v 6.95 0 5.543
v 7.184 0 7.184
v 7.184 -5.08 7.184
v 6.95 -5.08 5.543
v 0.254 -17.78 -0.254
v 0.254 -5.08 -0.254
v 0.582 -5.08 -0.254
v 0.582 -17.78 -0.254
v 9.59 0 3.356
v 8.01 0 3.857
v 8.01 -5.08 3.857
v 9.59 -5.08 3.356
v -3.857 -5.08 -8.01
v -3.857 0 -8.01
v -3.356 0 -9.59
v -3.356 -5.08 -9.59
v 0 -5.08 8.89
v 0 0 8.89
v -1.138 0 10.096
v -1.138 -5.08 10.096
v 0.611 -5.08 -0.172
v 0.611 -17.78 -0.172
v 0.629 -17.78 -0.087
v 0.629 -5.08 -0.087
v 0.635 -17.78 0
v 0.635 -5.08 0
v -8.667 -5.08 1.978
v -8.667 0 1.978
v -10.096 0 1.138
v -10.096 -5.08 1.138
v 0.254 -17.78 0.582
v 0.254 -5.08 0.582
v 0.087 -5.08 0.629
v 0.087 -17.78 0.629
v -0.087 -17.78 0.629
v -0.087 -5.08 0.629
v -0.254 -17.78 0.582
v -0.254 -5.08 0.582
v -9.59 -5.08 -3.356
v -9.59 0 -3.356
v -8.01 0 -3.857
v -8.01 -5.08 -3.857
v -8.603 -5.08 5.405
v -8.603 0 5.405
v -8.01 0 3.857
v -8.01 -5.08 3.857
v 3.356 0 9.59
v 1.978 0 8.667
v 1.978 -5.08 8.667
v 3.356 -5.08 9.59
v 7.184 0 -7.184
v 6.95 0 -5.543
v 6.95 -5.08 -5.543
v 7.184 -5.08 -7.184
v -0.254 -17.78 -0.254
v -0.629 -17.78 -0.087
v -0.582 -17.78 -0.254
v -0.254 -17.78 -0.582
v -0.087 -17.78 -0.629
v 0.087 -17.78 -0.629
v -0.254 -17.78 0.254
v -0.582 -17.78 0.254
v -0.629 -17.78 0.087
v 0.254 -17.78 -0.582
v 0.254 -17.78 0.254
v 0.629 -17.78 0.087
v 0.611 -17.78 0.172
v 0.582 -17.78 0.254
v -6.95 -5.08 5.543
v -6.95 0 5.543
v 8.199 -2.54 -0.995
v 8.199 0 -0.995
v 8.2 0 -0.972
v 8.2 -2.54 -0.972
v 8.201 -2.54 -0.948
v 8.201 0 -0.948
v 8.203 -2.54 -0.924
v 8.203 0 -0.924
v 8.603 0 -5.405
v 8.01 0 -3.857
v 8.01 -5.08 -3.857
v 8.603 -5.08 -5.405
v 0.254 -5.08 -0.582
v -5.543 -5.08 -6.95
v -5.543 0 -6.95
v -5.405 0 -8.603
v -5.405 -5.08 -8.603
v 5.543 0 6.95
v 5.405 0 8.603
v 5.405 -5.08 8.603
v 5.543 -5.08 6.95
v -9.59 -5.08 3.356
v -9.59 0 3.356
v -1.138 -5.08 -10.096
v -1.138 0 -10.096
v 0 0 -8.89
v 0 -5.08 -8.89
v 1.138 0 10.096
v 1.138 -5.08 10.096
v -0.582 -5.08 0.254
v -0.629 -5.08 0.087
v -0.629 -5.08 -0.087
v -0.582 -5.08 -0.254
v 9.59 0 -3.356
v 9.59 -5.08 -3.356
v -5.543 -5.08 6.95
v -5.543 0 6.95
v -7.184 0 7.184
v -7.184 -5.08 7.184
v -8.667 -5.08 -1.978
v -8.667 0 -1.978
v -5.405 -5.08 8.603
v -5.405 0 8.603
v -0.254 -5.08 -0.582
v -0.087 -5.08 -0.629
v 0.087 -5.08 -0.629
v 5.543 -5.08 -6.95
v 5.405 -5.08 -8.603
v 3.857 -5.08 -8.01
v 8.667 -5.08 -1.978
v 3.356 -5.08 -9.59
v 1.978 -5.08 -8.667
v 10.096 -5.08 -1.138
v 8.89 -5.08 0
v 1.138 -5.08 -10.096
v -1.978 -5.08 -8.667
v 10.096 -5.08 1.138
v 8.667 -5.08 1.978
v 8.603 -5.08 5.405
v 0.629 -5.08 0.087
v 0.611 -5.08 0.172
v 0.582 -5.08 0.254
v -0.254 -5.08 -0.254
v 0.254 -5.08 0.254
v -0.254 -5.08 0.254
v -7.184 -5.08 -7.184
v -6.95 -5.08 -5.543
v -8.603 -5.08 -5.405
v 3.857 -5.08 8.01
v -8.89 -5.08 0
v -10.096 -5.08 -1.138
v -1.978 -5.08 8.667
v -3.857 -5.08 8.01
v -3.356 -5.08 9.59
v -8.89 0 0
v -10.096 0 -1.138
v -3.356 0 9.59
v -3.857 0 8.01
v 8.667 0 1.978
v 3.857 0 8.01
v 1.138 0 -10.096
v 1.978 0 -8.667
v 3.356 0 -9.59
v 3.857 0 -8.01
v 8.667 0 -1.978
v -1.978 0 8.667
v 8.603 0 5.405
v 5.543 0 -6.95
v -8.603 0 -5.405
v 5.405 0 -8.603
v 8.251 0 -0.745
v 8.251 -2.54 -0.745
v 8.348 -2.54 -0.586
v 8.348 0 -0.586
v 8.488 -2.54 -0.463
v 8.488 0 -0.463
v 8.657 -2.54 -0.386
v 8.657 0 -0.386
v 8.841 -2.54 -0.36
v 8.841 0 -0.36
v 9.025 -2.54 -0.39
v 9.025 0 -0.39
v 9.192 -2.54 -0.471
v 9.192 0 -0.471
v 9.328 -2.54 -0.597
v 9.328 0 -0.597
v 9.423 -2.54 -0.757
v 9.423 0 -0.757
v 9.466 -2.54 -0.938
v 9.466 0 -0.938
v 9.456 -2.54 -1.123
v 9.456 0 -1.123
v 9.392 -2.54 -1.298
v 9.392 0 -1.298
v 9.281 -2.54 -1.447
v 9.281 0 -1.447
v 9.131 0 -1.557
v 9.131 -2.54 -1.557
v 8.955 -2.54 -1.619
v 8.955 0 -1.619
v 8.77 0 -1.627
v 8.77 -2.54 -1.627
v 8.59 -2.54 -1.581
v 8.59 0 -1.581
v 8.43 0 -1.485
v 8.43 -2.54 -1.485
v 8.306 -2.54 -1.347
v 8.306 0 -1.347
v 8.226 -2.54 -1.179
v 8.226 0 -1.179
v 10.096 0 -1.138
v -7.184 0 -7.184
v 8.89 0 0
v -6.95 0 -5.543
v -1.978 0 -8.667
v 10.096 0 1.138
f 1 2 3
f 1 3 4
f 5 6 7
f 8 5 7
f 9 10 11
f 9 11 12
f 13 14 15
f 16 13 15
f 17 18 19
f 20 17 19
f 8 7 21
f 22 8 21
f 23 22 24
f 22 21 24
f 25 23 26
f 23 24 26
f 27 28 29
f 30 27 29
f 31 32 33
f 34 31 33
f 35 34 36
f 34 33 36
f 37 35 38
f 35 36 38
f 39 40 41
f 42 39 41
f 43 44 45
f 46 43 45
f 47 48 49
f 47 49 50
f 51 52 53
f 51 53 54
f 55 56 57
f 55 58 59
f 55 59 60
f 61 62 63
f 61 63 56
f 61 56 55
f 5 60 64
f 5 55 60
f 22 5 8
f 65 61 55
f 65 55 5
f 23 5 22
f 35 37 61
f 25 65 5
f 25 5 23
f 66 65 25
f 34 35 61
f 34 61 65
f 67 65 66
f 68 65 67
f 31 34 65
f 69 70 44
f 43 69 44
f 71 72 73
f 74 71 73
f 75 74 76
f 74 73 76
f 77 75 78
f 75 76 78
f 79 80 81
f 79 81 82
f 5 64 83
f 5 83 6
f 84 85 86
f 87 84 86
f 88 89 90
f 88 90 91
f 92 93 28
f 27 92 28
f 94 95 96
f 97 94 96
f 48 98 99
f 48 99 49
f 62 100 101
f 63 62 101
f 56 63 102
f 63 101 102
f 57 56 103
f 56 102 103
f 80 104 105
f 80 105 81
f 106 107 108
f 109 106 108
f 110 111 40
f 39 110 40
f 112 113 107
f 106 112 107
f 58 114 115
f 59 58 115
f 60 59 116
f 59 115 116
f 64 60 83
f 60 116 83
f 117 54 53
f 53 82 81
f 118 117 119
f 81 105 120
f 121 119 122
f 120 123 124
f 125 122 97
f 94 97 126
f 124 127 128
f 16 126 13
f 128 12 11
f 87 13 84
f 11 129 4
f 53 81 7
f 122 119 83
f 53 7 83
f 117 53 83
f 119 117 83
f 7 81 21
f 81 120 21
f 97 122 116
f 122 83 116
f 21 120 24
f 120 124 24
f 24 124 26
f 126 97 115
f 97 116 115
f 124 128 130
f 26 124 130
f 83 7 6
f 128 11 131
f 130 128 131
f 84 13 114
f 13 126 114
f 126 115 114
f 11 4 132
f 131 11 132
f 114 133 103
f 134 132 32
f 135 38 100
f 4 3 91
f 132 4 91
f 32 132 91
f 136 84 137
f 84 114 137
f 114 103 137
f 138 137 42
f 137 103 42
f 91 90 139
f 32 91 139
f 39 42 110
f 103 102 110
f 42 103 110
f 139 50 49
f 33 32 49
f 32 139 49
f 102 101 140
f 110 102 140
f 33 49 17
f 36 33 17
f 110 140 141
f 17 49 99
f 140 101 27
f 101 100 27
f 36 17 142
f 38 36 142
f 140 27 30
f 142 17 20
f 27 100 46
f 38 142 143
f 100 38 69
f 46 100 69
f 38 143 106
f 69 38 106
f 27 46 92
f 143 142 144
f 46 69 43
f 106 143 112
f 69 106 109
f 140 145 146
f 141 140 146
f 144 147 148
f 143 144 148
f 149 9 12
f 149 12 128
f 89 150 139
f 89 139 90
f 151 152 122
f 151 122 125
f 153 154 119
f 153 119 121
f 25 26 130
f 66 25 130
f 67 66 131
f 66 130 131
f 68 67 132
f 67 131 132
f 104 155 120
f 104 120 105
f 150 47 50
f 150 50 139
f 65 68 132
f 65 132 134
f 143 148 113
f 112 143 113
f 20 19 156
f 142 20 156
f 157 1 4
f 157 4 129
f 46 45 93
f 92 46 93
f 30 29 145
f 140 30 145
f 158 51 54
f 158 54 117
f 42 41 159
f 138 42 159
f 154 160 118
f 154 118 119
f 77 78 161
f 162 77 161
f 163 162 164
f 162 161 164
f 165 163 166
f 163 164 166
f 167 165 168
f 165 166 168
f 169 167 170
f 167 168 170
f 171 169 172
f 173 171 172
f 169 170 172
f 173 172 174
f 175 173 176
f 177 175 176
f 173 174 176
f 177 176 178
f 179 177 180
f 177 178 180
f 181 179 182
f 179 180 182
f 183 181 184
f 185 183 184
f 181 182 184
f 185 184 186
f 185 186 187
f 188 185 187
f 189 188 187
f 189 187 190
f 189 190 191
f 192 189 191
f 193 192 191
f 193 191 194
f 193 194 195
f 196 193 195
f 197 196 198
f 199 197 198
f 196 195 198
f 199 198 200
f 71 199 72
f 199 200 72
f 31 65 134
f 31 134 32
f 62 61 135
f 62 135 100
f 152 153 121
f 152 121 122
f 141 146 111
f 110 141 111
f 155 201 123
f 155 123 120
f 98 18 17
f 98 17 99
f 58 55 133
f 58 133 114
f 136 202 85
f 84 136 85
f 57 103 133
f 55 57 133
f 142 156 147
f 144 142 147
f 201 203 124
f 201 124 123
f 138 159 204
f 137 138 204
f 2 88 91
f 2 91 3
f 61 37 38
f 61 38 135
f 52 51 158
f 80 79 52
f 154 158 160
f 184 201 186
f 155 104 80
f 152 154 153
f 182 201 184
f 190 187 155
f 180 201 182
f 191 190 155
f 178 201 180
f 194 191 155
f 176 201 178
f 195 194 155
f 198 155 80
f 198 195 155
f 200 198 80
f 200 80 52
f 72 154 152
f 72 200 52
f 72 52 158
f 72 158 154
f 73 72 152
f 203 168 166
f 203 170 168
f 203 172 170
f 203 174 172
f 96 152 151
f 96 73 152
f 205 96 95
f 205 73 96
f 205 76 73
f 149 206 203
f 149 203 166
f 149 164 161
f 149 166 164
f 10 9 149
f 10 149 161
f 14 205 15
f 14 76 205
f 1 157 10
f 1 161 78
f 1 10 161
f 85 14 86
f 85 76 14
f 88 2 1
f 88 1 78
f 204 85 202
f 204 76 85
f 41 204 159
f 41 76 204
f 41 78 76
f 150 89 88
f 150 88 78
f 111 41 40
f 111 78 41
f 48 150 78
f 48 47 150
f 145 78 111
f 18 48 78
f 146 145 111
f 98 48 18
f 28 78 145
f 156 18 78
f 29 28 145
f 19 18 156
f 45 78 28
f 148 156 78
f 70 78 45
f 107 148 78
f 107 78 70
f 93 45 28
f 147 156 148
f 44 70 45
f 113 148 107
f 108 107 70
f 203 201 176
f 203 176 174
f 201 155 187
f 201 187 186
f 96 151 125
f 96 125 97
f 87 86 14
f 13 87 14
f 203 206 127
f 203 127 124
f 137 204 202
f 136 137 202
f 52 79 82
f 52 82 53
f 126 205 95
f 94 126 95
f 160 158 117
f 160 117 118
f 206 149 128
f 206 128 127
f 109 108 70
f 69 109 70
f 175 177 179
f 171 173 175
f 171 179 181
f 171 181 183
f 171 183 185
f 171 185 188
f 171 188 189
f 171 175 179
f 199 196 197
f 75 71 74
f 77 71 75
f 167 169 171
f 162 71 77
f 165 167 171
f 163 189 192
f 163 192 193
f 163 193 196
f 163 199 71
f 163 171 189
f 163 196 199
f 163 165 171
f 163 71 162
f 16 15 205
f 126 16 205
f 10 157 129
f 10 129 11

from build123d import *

# Parameters (mm, degrees)
F1_DEPTH = 5.08
F3_W     = 0.508
F3_H     = 0.508
F4_DEPTH = 12.7
F6_DEPTH = 2.54


with BuildPart() as f1:
    # F0 (on Front) → F1 (new body)
    with BuildSketch(Plane.XZ):
        with BuildLine():
            Line((-4.7297651602, 7.5273781311), (0, 0))
            Line((0, 0), (-3.8572264408, 8.0096132357))
            ThreePointArc((-3.8572264408, 8.0096132357), (-4.3002609064, 7.7807362208), (-4.7297651602, 7.5273781311))
        make_face()
        with BuildLine():
            Line((-5.5428243385, 6.9504818791), (0, 0))
            Line((0, 0), (-4.7297651602, 7.5273781311))
            ThreePointArc((-4.7297651602, 7.5273781311), (-5.144387823, 7.250336125), (-5.5428243385, 6.9504818791))
        make_face()
        with BuildLine():
            Line((-5.4054458974, 8.6027178642), (-5.5428243385, 6.9504818791))
            ThreePointArc((-5.5428243385, 6.9504818791), (-5.144387823, 7.250336125), (-4.7297651602, 7.5273781311))
            Line((-4.7297651602, 7.5273781311), (-5.4054458974, 8.6027178642))
        make_face()
        with BuildLine():
            Line((-5.4054458974, 8.6027178642), (-4.7297651602, 7.5273781311))
            ThreePointArc((-4.7297651602, 7.5273781311), (-4.3002609064, 7.7807362208), (-3.8572264408, 8.0096132357))
            Line((-3.8572264408, 8.0096132357), (-5.4054458974, 8.6027178642))
        make_face()
        with BuildLine():
            Line((-3.3556352695, 9.5898546359), (-3.8572264408, 8.0096132357))
            ThreePointArc((-3.8572264408, 8.0096132357), (-3.4020557137, 8.213289044), (-2.9361808608, 8.3911228064))
            Line((-2.9361808608, 8.3911228064), (-3.3556352695, 9.5898546359))
        make_face()
        with BuildLine():
            Line((-3.3556352695, 9.5898546359), (-2.9361808608, 8.3911228064))
            ThreePointArc((-2.9361808608, 8.3911228064), (-2.4610676966, 8.5425549921), (-1.9782111029, 8.6671091393))
            Line((-1.9782111029, 8.6671091393), (-3.3556352695, 9.5898546359))
        make_face()
        with BuildLine():
            Line((-2.9361808608, 8.3911228064), (0, 0))
            Line((0, 0), (-1.9782111029, 8.6671091393))
            ThreePointArc((-1.9782111029, 8.6671091393), (-2.4610676966, 8.5425549921), (-2.9361808608, 8.3911228064))
        make_face()
        with BuildLine():
            Line((-3.8572264408, 8.0096132357), (0, 0))
            Line((0, 0), (-2.9361808608, 8.3911228064))
            ThreePointArc((-2.9361808608, 8.3911228064), (-3.4020557137, 8.213289044), (-3.8572264408, 8.0096132357))
        make_face()
        with BuildLine():
            Line((-0.9953641926, 8.834101546), (0, 0))
            Line((0, 0), (0, 8.89))
            ThreePointArc((0, 8.89), (-0.4984662759, 8.8760143855), (-0.9953641926, 8.834101546))
        make_face()
        with BuildLine():
            ThreePointArc((-0.9953641926, 8.834101546), (-0.4984662759, 8.8760143855), (0, 8.89))
            Line((0, 8.89), (-1.1375590772, 10.0961160525))
            Line((-1.1375590772, 10.0961160525), (-0.9953641926, 8.834101546))
        make_face()
        with BuildLine():
            Line((-1.1375590772, 10.0961160525), (-1.9782111029, 8.6671091393))
            ThreePointArc((-1.9782111029, 8.6671091393), (-1.4891303252, 8.7643933546), (-0.9953641926, 8.834101546))
            Line((-0.9953641926, 8.834101546), (-1.1375590772, 10.0961160525))
        make_face()
        with BuildLine():
            Line((-1.9782111029, 8.6671091393), (0, 0))
            Line((0, 0), (-0.9953641926, 8.834101546))
            ThreePointArc((-0.9953641926, 8.834101546), (-1.4891303252, 8.7643933546), (-1.9782111029, 8.6671091393))
        make_face()
        with BuildLine():
            Line((-6.2861792847, 6.2861792847), (0, 0))
            Line((0, 0), (-5.5428243385, 6.9504818791))
            ThreePointArc((-5.5428243385, 6.9504818791), (-5.923821078, 6.6287588458), (-6.2861792847, 6.2861792847))
        make_face()
        with BuildLine():
            Line((-7.1842048969, 7.1842048969), (-6.2861792847, 6.2861792847))
            ThreePointArc((-6.2861792847, 6.2861792847), (-5.923821078, 6.6287588458), (-5.5428243385, 6.9504818791))
            Line((-5.5428243385, 6.9504818791), (-7.1842048969, 7.1842048969))
        make_face()
        with BuildLine():
            Line((-6.9504818791, 5.5428243385), (0, 0))
            Line((0, 0), (-6.2861792847, 6.2861792847))
            ThreePointArc((-6.2861792847, 6.2861792847), (-6.6287588458, 5.923821078), (-6.9504818791, 5.5428243385))
        make_face()
        with BuildLine():
            Line((-7.1842048969, 7.1842048969), (-6.9504818791, 5.5428243385))
            ThreePointArc((-6.9504818791, 5.5428243385), (-6.6287588458, 5.923821078), (-6.2861792847, 6.2861792847))
            Line((-6.2861792847, 6.2861792847), (-7.1842048969, 7.1842048969))
        make_face()
        with BuildLine():
            Line((-7.5273781311, 4.7297651602), (0, 0))
            Line((0, 0), (-6.9504818791, 5.5428243385))
            ThreePointArc((-6.9504818791, 5.5428243385), (-7.250336125, 5.144387823), (-7.5273781311, 4.7297651602))
        make_face()
        with BuildLine():
            Line((-8.6027178642, 5.4054458974), (-7.5273781311, 4.7297651602))
            ThreePointArc((-7.5273781311, 4.7297651602), (-7.250336125, 5.144387823), (-6.9504818791, 5.5428243385))
            Line((-6.9504818791, 5.5428243385), (-8.6027178642, 5.4054458974))
        make_face()
        with BuildLine():
            Line((-8.6027178642, 5.4054458974), (-8.0096132357, 3.8572264408))
            ThreePointArc((-8.0096132357, 3.8572264408), (-7.7807362208, 4.3002609064), (-7.5273781311, 4.7297651602))
            Line((-7.5273781311, 4.7297651602), (-8.6027178642, 5.4054458974))
        make_face()
        with BuildLine():
            Line((-8.0096132357, 3.8572264408), (0, 0))
            Line((0, 0), (-7.5273781311, 4.7297651602))
            ThreePointArc((-7.5273781311, 4.7297651602), (-7.7807362208, 4.3002609064), (-8.0096132357, 3.8572264408))
        make_face()
        with BuildLine():
            Line((-8.3911228064, 2.9361808608), (0, 0))
            Line((0, 0), (-8.0096132357, 3.8572264408))
            ThreePointArc((-8.0096132357, 3.8572264408), (-8.213289044, 3.4020557137), (-8.3911228064, 2.9361808608))
        make_face()
        with BuildLine():
            Line((-9.5898546359, 3.3556352695), (-8.3911228064, 2.9361808608))
            ThreePointArc((-8.3911228064, 2.9361808608), (-8.213289044, 3.4020557137), (-8.0096132357, 3.8572264408))
            Line((-8.0096132357, 3.8572264408), (-9.5898546359, 3.3556352695))
        make_face()
        with BuildLine():
            Line((-9.5898546359, 3.3556352695), (-8.6671091393, 1.9782111029))
            ThreePointArc((-8.6671091393, 1.9782111029), (-8.5425549921, 2.4610676966), (-8.3911228064, 2.9361808608))
            Line((-8.3911228064, 2.9361808608), (-9.5898546359, 3.3556352695))
        make_face()
        with BuildLine():
            Line((-8.6671091393, 1.9782111029), (0, 0))
            Line((0, 0), (-8.3911228064, 2.9361808608))
            ThreePointArc((-8.3911228064, 2.9361808608), (-8.5425549921, 2.4610676966), (-8.6671091393, 1.9782111029))
        make_face()
        with BuildLine():
            Line((-8.834101546, 0.9953641926), (0, 0))
            Line((0, 0), (-8.6671091393, 1.9782111029))
            ThreePointArc((-8.6671091393, 1.9782111029), (-8.7643933546, 1.4891303252), (-8.834101546, 0.9953641926))
        make_face()
        with BuildLine():
            Line((-10.0961160525, 1.1375590772), (-8.834101546, 0.9953641926))
            ThreePointArc((-8.834101546, 0.9953641926), (-8.7643933546, 1.4891303252), (-8.6671091393, 1.9782111029))
            Line((-8.6671091393, 1.9782111029), (-10.0961160525, 1.1375590772))
        make_face()
        with BuildLine():
            Line((-10.0961160525, 1.1375590772), (-8.89, 0))
            ThreePointArc((-8.89, 0), (-8.8760143855, 0.4984662759), (-8.834101546, 0.9953641926))
            Line((-8.834101546, 0.9953641926), (-10.0961160525, 1.1375590772))
        make_face()
        with BuildLine():
            Line((-8.89, 0), (0, 0))
            Line((0, 0), (-8.834101546, 0.9953641926))
            ThreePointArc((-8.834101546, 0.9953641926), (-8.8760143855, 0.4984662759), (-8.89, 0))
        make_face()
        with BuildLine():
            Line((-8.834101546, -0.9953641926), (0, 0))
            Line((0, 0), (-8.89, 0))
            ThreePointArc((-8.89, 0), (-8.8760143855, -0.4984662759), (-8.834101546, -0.9953641926))
        make_face()
        with BuildLine():
            Line((-10.0961160525, -1.1375590772), (-8.834101546, -0.9953641926))
            ThreePointArc((-8.834101546, -0.9953641926), (-8.8760143855, -0.4984662759), (-8.89, 0))
            Line((-8.89, 0), (-10.0961160525, -1.1375590772))
        make_face()
        with BuildLine():
            Line((-10.0961160525, -1.1375590772), (-8.6671091393, -1.9782111029))
            ThreePointArc((-8.6671091393, -1.9782111029), (-8.7643933546, -1.4891303252), (-8.834101546, -0.9953641926))
            Line((-8.834101546, -0.9953641926), (-10.0961160525, -1.1375590772))
        make_face()
        with BuildLine():
            Line((-8.6671091393, -1.9782111029), (0, 0))
            Line((0, 0), (-8.834101546, -0.9953641926))
            ThreePointArc((-8.834101546, -0.9953641926), (-8.7643933546, -1.4891303252), (-8.6671091393, -1.9782111029))
        make_face()
        with BuildLine():
            Line((-8.3911228064, -2.9361808608), (0, 0))
            Line((0, 0), (-8.6671091393, -1.9782111029))
            ThreePointArc((-8.6671091393, -1.9782111029), (-8.5425549921, -2.4610676966), (-8.3911228064, -2.9361808608))
        make_face()
        with BuildLine():
            Line((-9.5898546359, -3.3556352695), (-8.3911228064, -2.9361808608))
            ThreePointArc((-8.3911228064, -2.9361808608), (-8.5425549921, -2.4610676966), (-8.6671091393, -1.9782111029))
            Line((-8.6671091393, -1.9782111029), (-9.5898546359, -3.3556352695))
        make_face()
        with BuildLine():
            Line((-9.5898546359, -3.3556352695), (-8.0096132357, -3.8572264408))
            ThreePointArc((-8.0096132357, -3.8572264408), (-8.213289044, -3.4020557137), (-8.3911228064, -2.9361808608))
            Line((-8.3911228064, -2.9361808608), (-9.5898546359, -3.3556352695))
        make_face()
        with BuildLine():
            Line((-8.0096132357, -3.8572264408), (0, 0))
            Line((0, 0), (-8.3911228064, -2.9361808608))
            ThreePointArc((-8.3911228064, -2.9361808608), (-8.213289044, -3.4020557137), (-8.0096132357, -3.8572264408))
        make_face()
        with BuildLine():
            Line((-7.5273781311, -4.7297651602), (0, 0))
            Line((0, 0), (-8.0096132357, -3.8572264408))
            ThreePointArc((-8.0096132357, -3.8572264408), (-7.7807362208, -4.3002609064), (-7.5273781311, -4.7297651602))
        make_face()
        with BuildLine():
            Line((-8.6027178642, -5.4054458974), (-7.5273781311, -4.7297651602))
            ThreePointArc((-7.5273781311, -4.7297651602), (-7.7807362208, -4.3002609064), (-8.0096132357, -3.8572264408))
            Line((-8.0096132357, -3.8572264408), (-8.6027178642, -5.4054458974))
        make_face()
        with BuildLine():
            Line((-8.6027178642, -5.4054458974), (-6.9504818791, -5.5428243385))
            ThreePointArc((-6.9504818791, -5.5428243385), (-7.250336125, -5.144387823), (-7.5273781311, -4.7297651602))
            Line((-7.5273781311, -4.7297651602), (-8.6027178642, -5.4054458974))
        make_face()
        with BuildLine():
            Line((-6.9504818791, -5.5428243385), (0, 0))
            Line((0, 0), (-7.5273781311, -4.7297651602))
            ThreePointArc((-7.5273781311, -4.7297651602), (-7.250336125, -5.144387823), (-6.9504818791, -5.5428243385))
        make_face()
        with BuildLine():
            Line((-6.2861792847, -6.2861792847), (0, 0))
            Line((0, 0), (-6.9504818791, -5.5428243385))
            ThreePointArc((-6.9504818791, -5.5428243385), (-6.6287588458, -5.923821078), (-6.2861792847, -6.2861792847))
        make_face()
        with BuildLine():
            Line((-5.5428243385, -6.9504818791), (0, 0))
            Line((0, 0), (-6.2861792847, -6.2861792847))
            ThreePointArc((-6.2861792847, -6.2861792847), (-5.923821078, -6.6287588458), (-5.5428243385, -6.9504818791))
        make_face()
        with BuildLine():
            Line((-4.7297651602, -7.5273781311), (0, 0))
            Line((0, 0), (-5.5428243385, -6.9504818791))
            ThreePointArc((-5.5428243385, -6.9504818791), (-5.144387823, -7.250336125), (-4.7297651602, -7.5273781311))
        make_face()
        with BuildLine():
            Line((-7.1842048969, -7.1842048969), (-6.2861792847, -6.2861792847))
            ThreePointArc((-6.2861792847, -6.2861792847), (-6.6287588458, -5.923821078), (-6.9504818791, -5.5428243385))
            Line((-6.9504818791, -5.5428243385), (-7.1842048969, -7.1842048969))
        make_face()
        with BuildLine():
            Line((-7.1842048969, -7.1842048969), (-5.5428243385, -6.9504818791))
            ThreePointArc((-5.5428243385, -6.9504818791), (-5.923821078, -6.6287588458), (-6.2861792847, -6.2861792847))
            Line((-6.2861792847, -6.2861792847), (-7.1842048969, -7.1842048969))
        make_face()
        with BuildLine():
            Line((-5.4054458974, -8.6027178642), (-4.7297651602, -7.5273781311))
            ThreePointArc((-4.7297651602, -7.5273781311), (-5.144387823, -7.250336125), (-5.5428243385, -6.9504818791))
            Line((-5.5428243385, -6.9504818791), (-5.4054458974, -8.6027178642))
        make_face()
        with BuildLine():
            Line((-5.4054458974, -8.6027178642), (-3.8572264408, -8.0096132357))
            ThreePointArc((-3.8572264408, -8.0096132357), (-4.3002609064, -7.7807362208), (-4.7297651602, -7.5273781311))
            Line((-4.7297651602, -7.5273781311), (-5.4054458974, -8.6027178642))
        make_face()
        with BuildLine():
            Line((-2.9361808608, -8.3911228064), (0, 0))
            Line((0, 0), (-3.8572264408, -8.0096132357))
            ThreePointArc((-3.8572264408, -8.0096132357), (-3.4020557137, -8.213289044), (-2.9361808608, -8.3911228064))
        make_face()
        with BuildLine():
            Line((-3.3556352695, -9.5898546359), (-2.9361808608, -8.3911228064))
            ThreePointArc((-2.9361808608, -8.3911228064), (-3.4020557137, -8.213289044), (-3.8572264408, -8.0096132357))
            Line((-3.8572264408, -8.0096132357), (-3.3556352695, -9.5898546359))
        make_face()
        with BuildLine():
            Line((-3.3556352695, -9.5898546359), (-1.9782111029, -8.6671091393))
            ThreePointArc((-1.9782111029, -8.6671091393), (-2.4610676966, -8.5425549921), (-2.9361808608, -8.3911228064))
            Line((-2.9361808608, -8.3911228064), (-3.3556352695, -9.5898546359))
        make_face()
        with BuildLine():
            Line((-1.9782111029, -8.6671091393), (0, 0))
            Line((0, 0), (-2.9361808608, -8.3911228064))
            ThreePointArc((-2.9361808608, -8.3911228064), (-2.4610676966, -8.5425549921), (-1.9782111029, -8.6671091393))
        make_face()
        with BuildLine():
            Line((-0.9953641926, -8.834101546), (0, 0))
            Line((0, 0), (-1.9782111029, -8.6671091393))
            ThreePointArc((-1.9782111029, -8.6671091393), (-1.4891303252, -8.7643933546), (-0.9953641926, -8.834101546))
        make_face()
        with BuildLine():
            Line((-1.1375590772, -10.0961160525), (0, -8.89))
            ThreePointArc((0, -8.89), (-0.4984662759, -8.8760143855), (-0.9953641926, -8.834101546))
            Line((-0.9953641926, -8.834101546), (-1.1375590772, -10.0961160525))
        make_face()
        with BuildLine():
            ThreePointArc((-0.9953641926, -8.834101546), (-1.4891303252, -8.7643933546), (-1.9782111029, -8.6671091393))
            Line((-1.9782111029, -8.6671091393), (-1.1375590772, -10.0961160525))
            Line((-1.1375590772, -10.0961160525), (-0.9953641926, -8.834101546))
        make_face()
        with BuildLine():
            Line((0, -8.89), (0, 0))
            Line((0, 0), (-0.9953641926, -8.834101546))
            ThreePointArc((-0.9953641926, -8.834101546), (-0.4984662759, -8.8760143855), (0, -8.89))
        make_face()
        with BuildLine():
            Line((-3.8572264408, -8.0096132357), (0, 0))
            Line((0, 0), (-4.7297651602, -7.5273781311))
            ThreePointArc((-4.7297651602, -7.5273781311), (-4.3002609064, -7.7807362208), (-3.8572264408, -8.0096132357))
        make_face()
    extrude(amount=F1_DEPTH)

    # F2: F1 across plane


with BuildPart() as f1_1:
    add(f1.part)
    add(f1.part.mirror(Plane.YZ))

    # F3 (on face) → F4 (join)
    with BuildSketch(Plane.XZ.offset(5.08)):
        with BuildLine():
            Line((0.254, 0.254), (0.254, 0.5819871133))
            ThreePointArc((0.254, 0.5819871133), (0, 0.635), (-0.254, 0.5819871133))
            Line((-0.254, 0.5819871133), (-0.254, 0.254))
            Line((-0.254, 0.254), (0.254, 0.254))
        make_face()
        with BuildLine():
            Line((-0.254, -0.254), (-0.254, 0.254))
            Line((-0.254, 0.254), (-0.5819871133, 0.254))
            ThreePointArc((-0.5819871133, 0.254), (-0.635, 0), (-0.5819871133, -0.254))
            Line((-0.5819871133, -0.254), (-0.254, -0.254))
        make_face()
        Rectangle(F3_W, F3_H)
        with BuildLine():
            ThreePointArc((0.5819871133, -0.254), (0.6216055087, -0.1297366237), (0.635, 0))
            ThreePointArc((0.635, 0), (0.6216055087, 0.1297366237), (0.5819871133, 0.254))
            Line((0.5819871133, 0.254), (0.254, 0.254))
            Line((0.254, 0.254), (0.254, -0.254))
            Line((0.254, -0.254), (0.5819871133, -0.254))
        make_face()
        with BuildLine():
            ThreePointArc((-0.254, -0.5819871133), (0, -0.635), (0.254, -0.5819871133))
            Line((0.254, -0.5819871133), (0.254, -0.254))
            Line((0.254, -0.254), (-0.254, -0.254))
            Line((-0.254, -0.254), (-0.254, -0.5819871133))
        make_face()
    extrude(amount=F4_DEPTH)

    # F5 (on face) → F6 (cut)
    with BuildSketch(Plane(origin=(0, 0, 0), x_dir=(-1, 0, 0), z_dir=(0, 1, 0))):
        with BuildLine():
            ThreePointArc((-8.2030942927, -0.9242667502), (-9.4681025735, -1.0309689266), (-8.199101546, -0.9953641926))
            ThreePointArc((-8.199101546, -0.9953641926), (-8.2001005184, -0.9597594586), (-8.2030942927, -0.9242667502))
        make_face()
    extrude(amount=-F6_DEPTH, mode=Mode.SUBTRACT)


solid = f1_1.part
